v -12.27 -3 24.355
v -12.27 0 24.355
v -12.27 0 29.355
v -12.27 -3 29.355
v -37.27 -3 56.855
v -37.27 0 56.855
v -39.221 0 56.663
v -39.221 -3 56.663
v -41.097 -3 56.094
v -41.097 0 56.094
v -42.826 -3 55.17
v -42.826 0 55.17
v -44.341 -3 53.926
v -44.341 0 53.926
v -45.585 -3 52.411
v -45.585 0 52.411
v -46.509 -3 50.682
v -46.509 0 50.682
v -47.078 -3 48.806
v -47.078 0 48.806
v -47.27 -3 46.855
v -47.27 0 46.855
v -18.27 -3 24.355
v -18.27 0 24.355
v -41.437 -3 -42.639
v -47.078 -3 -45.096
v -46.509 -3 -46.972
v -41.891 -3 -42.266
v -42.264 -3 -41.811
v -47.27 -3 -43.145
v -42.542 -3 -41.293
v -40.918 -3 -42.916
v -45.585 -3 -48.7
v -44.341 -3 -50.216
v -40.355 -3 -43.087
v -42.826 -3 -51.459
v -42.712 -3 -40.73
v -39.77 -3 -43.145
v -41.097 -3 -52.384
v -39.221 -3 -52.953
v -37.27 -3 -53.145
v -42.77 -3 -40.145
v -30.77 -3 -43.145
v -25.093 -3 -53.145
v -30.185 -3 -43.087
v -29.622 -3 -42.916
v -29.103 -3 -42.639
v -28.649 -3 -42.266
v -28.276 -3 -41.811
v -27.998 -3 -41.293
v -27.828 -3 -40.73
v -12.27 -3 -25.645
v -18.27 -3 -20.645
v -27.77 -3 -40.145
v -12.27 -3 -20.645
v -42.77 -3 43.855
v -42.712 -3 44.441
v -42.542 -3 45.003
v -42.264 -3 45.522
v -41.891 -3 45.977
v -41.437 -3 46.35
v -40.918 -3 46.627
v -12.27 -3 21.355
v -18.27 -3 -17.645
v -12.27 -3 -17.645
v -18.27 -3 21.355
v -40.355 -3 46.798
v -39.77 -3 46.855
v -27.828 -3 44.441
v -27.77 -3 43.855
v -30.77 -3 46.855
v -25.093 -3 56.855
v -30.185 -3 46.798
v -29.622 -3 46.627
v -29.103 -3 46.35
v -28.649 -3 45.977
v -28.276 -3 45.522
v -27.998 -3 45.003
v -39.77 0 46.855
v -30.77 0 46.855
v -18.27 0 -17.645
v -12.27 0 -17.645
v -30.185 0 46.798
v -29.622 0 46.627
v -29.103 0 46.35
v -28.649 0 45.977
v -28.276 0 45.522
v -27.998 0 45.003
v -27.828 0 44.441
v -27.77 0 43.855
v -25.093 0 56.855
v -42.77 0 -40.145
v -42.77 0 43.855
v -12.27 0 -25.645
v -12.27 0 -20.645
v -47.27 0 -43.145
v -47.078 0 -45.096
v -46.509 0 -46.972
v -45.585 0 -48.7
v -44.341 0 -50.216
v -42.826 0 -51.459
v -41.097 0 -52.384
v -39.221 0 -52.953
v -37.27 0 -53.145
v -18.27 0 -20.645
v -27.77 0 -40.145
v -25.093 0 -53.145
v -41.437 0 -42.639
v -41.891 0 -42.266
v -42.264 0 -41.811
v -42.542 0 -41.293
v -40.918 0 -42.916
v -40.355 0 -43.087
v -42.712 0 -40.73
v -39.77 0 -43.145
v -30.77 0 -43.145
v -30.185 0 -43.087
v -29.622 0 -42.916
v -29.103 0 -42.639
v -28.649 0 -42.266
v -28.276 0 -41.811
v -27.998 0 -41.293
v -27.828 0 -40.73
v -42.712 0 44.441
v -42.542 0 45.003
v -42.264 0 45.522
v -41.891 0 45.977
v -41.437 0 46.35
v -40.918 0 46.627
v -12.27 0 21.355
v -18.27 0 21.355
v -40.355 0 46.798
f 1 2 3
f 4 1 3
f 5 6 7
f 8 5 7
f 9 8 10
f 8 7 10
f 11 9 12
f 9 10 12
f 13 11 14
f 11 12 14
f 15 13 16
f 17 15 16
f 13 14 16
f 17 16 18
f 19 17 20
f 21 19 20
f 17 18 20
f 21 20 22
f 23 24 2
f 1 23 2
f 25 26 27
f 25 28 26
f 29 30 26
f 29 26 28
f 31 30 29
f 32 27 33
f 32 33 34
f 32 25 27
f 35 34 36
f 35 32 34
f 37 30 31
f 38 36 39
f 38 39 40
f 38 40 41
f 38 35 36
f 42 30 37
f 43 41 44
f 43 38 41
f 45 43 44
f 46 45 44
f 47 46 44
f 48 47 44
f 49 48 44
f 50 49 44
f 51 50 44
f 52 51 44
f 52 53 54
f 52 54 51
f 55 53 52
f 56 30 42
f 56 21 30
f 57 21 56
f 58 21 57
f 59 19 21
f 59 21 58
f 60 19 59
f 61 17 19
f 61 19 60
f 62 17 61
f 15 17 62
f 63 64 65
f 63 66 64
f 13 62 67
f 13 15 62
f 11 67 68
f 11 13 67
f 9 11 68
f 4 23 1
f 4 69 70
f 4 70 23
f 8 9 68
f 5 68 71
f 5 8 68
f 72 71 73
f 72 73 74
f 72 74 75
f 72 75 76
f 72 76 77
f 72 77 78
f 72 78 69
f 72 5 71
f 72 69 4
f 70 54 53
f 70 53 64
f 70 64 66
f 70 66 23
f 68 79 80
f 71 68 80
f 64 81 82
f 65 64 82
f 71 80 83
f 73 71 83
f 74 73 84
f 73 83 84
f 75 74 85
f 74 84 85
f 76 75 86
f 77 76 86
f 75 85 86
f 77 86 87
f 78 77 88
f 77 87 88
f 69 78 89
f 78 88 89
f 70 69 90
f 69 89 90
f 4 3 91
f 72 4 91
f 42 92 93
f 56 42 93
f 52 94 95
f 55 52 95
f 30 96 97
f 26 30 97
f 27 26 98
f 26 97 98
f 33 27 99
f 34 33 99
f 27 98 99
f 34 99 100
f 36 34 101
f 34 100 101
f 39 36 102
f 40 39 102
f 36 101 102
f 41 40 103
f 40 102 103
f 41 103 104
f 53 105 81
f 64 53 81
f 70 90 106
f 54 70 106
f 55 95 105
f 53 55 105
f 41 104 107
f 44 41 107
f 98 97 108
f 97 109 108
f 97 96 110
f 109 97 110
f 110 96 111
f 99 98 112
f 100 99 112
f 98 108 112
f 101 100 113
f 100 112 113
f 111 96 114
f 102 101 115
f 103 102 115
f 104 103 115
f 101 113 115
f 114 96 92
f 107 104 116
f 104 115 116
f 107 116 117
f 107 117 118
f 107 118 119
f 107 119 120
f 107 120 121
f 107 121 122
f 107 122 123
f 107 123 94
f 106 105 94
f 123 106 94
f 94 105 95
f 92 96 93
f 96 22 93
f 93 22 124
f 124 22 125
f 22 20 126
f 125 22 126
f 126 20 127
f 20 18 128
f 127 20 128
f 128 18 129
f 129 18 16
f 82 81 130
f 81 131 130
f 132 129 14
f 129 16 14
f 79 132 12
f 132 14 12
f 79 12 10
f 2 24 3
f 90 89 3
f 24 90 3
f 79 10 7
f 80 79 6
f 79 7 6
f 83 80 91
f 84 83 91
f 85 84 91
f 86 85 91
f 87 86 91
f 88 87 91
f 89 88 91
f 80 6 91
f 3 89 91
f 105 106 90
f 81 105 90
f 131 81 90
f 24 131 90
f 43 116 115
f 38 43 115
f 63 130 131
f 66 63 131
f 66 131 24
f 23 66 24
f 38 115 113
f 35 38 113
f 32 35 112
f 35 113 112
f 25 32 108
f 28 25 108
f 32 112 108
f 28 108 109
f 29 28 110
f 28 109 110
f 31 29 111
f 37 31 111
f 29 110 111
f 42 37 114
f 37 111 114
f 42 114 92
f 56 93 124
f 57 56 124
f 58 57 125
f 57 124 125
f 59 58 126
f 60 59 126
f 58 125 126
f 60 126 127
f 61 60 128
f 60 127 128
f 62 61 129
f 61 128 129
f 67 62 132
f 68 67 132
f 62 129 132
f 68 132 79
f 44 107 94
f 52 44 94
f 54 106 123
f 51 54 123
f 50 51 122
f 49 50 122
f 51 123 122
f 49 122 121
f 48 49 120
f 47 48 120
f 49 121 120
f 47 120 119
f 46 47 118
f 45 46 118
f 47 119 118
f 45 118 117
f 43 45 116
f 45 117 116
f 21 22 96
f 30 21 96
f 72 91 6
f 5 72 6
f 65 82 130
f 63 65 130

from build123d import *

# Parameters (mm, degrees)
F1_DEPTH = 3


with BuildPart() as f1:
    # F0 (on Front) → F1 (new body)
    with BuildSketch(Plane.XZ):
        with BuildLine():
            ThreePointArc((-37.269928, 56.85529), (-44.340996, 53.926358), (-47.269928, 46.85529))
            Line((-47.269928, 46.85529), (-47.269928, 1.85529))
            Line((-47.269928, 1.85529), (-47.269928, -43.14471))
            ThreePointArc((-47.269928, -43.14471), (-44.340996, -50.215777), (-37.269928, -53.14471))
            Line((-37.269928, -53.14471), (-25.093389, -53.14471))
            Line((-25.093389, -53.14471), (-12.269928, -25.64471))
            Line((-12.269928, -25.64471), (-12.269928, -20.64471))
            Line((-12.269928, -20.64471), (-18.269928, -20.64471))
            Line((-18.269928, -20.64471), (-18.269928, -17.64471))
            Line((-18.269928, -17.64471), (-12.269928, -17.64471))
            Line((-12.269928, -17.64471), (-12.269928, 1.85529))
            Line((-12.269928, 1.85529), (-12.269928, 21.35529))
            Line((-12.269928, 21.35529), (-18.269928, 21.35529))
            Line((-18.269928, 21.35529), (-18.269928, 24.35529))
            Line((-18.269928, 24.35529), (-12.269928, 24.35529))
            Line((-12.269928, 24.35529), (-12.269928, 29.35529))
            Line((-12.269928, 29.35529), (-25.093389, 56.85529))
            Line((-25.093389, 56.85529), (-37.269928, 56.85529))
        make_face()
        with BuildLine():
            ThreePointArc((-42.769928, 43.85529), (-41.891248, 45.976611), (-39.769928, 46.85529))
            Line((-39.769928, 46.85529), (-30.769928, 46.85529))
            ThreePointArc((-30.769928, 46.85529), (-28.648608, 45.976611), (-27.769928, 43.85529))
            Line((-27.769928, 43.85529), (-27.769928, 1.85529))
            Line((-27.769928, 1.85529), (-27.769928, -40.14471))
            ThreePointArc((-27.769928, -40.14471), (-28.648608, -42.26603), (-30.769928, -43.14471))
            Line((-30.769928, -43.14471), (-39.769928, -43.14471))
            ThreePointArc((-39.769928, -43.14471), (-41.891248, -42.26603), (-42.769928, -40.14471))
            Line((-42.769928, -40.14471), (-42.769928, 1.85529))
            Line((-42.769928, 1.85529), (-42.769928, 43.85529))
        make_face(mode=Mode.SUBTRACT)
    extrude(amount=F1_DEPTH)


solid = f1.part
